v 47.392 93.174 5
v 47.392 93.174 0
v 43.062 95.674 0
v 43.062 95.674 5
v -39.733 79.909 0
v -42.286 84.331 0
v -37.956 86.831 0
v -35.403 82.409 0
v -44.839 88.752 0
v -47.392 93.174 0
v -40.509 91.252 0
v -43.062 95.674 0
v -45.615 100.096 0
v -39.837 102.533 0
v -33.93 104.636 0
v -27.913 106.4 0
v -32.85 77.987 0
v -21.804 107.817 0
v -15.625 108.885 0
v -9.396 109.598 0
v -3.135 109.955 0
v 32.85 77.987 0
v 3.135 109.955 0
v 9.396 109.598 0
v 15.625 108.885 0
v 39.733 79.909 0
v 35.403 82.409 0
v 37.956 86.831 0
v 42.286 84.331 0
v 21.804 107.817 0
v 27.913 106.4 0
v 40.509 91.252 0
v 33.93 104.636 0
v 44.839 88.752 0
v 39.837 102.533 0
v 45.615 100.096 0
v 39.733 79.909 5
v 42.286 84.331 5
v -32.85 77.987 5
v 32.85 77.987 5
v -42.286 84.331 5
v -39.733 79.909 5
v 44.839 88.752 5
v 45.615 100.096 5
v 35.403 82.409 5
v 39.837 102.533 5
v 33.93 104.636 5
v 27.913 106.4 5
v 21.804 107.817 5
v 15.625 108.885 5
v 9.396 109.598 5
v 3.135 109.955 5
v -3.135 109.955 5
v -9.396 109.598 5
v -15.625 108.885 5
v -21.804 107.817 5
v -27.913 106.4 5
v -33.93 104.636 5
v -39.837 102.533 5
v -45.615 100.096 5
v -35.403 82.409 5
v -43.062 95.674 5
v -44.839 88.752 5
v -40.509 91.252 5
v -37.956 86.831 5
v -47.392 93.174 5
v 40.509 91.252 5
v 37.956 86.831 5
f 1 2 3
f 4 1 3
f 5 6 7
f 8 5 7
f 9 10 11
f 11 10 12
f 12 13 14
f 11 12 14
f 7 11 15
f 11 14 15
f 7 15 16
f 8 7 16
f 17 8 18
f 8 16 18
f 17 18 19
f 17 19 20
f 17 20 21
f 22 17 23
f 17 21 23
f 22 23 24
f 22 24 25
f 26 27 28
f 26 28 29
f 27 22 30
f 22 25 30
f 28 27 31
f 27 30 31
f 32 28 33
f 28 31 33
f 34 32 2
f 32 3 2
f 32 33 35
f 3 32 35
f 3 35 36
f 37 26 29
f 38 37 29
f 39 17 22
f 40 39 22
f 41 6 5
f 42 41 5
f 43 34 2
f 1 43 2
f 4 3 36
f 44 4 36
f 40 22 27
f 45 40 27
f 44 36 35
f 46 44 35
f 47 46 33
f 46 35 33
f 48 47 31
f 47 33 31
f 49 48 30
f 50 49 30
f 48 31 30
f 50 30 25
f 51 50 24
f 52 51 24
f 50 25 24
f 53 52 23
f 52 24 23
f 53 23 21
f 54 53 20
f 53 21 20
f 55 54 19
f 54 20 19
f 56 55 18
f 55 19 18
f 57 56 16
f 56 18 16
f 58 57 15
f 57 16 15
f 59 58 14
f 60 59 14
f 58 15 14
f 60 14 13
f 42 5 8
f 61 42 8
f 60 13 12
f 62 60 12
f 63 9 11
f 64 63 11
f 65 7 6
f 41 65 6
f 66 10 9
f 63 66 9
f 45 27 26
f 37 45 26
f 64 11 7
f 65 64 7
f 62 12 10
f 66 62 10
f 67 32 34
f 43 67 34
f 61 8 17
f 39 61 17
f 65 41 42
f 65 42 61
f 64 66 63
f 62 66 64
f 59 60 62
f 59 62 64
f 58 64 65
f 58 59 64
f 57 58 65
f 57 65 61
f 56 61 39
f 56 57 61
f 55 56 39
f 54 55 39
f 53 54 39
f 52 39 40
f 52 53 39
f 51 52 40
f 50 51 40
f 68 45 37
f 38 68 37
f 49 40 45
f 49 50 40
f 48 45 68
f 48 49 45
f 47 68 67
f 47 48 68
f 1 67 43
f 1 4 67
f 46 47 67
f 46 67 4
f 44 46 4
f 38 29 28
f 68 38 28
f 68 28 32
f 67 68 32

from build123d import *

# Parameters (mm, degrees)
BOSS_EXTRUDE1_DEPTH = 5


with BuildPart() as part:
    # Sketch1 → Boss-Extrude1 (new body)
    with BuildSketch(Plane.XY):
        with BuildLine():
            Line((-32.85, 77.986683936), (32.85, 77.986683936))
            Line((32.85, 77.986683936), (35.403, 82.408609648))
            Line((35.403, 82.408609648), (39.733127019, 79.908609648))
            Line((39.733127019, 79.908609648), (42.286127019, 84.330535359))
            Line((42.286127019, 84.330535359), (37.956, 86.830535359))
            Line((37.956, 86.830535359), (40.509, 91.252461071))
            Line((40.509, 91.252461071), (44.839127019, 88.752461071))
            Line((44.839127019, 88.752461071), (47.392127019, 93.174386783))
            Line((47.392127019, 93.174386783), (43.062, 95.674386783))
            Line((43.062, 95.674386783), (45.615, 100.096312495))
            ThreePointArc((45.615, 100.096312495), (0, 110), (-45.615, 100.096312495))
            Line((-45.615, 100.096312495), (-43.062, 95.674386783))
            Line((-43.062, 95.674386783), (-47.392127019, 93.174386783))
            Line((-47.392127019, 93.174386783), (-44.839127019, 88.752461071))
            Line((-44.839127019, 88.752461071), (-40.509, 91.252461071))
            Line((-40.509, 91.252461071), (-37.956, 86.830535359))
            Line((-37.956, 86.830535359), (-42.286127019, 84.330535359))
            Line((-42.286127019, 84.330535359), (-39.733127019, 79.908609648))
            Line((-39.733127019, 79.908609648), (-35.403, 82.408609648))
            Line((-35.403, 82.408609648), (-32.85, 77.986683936))
        make_face()
    extrude(amount=BOSS_EXTRUDE1_DEPTH)


solid = part.part
